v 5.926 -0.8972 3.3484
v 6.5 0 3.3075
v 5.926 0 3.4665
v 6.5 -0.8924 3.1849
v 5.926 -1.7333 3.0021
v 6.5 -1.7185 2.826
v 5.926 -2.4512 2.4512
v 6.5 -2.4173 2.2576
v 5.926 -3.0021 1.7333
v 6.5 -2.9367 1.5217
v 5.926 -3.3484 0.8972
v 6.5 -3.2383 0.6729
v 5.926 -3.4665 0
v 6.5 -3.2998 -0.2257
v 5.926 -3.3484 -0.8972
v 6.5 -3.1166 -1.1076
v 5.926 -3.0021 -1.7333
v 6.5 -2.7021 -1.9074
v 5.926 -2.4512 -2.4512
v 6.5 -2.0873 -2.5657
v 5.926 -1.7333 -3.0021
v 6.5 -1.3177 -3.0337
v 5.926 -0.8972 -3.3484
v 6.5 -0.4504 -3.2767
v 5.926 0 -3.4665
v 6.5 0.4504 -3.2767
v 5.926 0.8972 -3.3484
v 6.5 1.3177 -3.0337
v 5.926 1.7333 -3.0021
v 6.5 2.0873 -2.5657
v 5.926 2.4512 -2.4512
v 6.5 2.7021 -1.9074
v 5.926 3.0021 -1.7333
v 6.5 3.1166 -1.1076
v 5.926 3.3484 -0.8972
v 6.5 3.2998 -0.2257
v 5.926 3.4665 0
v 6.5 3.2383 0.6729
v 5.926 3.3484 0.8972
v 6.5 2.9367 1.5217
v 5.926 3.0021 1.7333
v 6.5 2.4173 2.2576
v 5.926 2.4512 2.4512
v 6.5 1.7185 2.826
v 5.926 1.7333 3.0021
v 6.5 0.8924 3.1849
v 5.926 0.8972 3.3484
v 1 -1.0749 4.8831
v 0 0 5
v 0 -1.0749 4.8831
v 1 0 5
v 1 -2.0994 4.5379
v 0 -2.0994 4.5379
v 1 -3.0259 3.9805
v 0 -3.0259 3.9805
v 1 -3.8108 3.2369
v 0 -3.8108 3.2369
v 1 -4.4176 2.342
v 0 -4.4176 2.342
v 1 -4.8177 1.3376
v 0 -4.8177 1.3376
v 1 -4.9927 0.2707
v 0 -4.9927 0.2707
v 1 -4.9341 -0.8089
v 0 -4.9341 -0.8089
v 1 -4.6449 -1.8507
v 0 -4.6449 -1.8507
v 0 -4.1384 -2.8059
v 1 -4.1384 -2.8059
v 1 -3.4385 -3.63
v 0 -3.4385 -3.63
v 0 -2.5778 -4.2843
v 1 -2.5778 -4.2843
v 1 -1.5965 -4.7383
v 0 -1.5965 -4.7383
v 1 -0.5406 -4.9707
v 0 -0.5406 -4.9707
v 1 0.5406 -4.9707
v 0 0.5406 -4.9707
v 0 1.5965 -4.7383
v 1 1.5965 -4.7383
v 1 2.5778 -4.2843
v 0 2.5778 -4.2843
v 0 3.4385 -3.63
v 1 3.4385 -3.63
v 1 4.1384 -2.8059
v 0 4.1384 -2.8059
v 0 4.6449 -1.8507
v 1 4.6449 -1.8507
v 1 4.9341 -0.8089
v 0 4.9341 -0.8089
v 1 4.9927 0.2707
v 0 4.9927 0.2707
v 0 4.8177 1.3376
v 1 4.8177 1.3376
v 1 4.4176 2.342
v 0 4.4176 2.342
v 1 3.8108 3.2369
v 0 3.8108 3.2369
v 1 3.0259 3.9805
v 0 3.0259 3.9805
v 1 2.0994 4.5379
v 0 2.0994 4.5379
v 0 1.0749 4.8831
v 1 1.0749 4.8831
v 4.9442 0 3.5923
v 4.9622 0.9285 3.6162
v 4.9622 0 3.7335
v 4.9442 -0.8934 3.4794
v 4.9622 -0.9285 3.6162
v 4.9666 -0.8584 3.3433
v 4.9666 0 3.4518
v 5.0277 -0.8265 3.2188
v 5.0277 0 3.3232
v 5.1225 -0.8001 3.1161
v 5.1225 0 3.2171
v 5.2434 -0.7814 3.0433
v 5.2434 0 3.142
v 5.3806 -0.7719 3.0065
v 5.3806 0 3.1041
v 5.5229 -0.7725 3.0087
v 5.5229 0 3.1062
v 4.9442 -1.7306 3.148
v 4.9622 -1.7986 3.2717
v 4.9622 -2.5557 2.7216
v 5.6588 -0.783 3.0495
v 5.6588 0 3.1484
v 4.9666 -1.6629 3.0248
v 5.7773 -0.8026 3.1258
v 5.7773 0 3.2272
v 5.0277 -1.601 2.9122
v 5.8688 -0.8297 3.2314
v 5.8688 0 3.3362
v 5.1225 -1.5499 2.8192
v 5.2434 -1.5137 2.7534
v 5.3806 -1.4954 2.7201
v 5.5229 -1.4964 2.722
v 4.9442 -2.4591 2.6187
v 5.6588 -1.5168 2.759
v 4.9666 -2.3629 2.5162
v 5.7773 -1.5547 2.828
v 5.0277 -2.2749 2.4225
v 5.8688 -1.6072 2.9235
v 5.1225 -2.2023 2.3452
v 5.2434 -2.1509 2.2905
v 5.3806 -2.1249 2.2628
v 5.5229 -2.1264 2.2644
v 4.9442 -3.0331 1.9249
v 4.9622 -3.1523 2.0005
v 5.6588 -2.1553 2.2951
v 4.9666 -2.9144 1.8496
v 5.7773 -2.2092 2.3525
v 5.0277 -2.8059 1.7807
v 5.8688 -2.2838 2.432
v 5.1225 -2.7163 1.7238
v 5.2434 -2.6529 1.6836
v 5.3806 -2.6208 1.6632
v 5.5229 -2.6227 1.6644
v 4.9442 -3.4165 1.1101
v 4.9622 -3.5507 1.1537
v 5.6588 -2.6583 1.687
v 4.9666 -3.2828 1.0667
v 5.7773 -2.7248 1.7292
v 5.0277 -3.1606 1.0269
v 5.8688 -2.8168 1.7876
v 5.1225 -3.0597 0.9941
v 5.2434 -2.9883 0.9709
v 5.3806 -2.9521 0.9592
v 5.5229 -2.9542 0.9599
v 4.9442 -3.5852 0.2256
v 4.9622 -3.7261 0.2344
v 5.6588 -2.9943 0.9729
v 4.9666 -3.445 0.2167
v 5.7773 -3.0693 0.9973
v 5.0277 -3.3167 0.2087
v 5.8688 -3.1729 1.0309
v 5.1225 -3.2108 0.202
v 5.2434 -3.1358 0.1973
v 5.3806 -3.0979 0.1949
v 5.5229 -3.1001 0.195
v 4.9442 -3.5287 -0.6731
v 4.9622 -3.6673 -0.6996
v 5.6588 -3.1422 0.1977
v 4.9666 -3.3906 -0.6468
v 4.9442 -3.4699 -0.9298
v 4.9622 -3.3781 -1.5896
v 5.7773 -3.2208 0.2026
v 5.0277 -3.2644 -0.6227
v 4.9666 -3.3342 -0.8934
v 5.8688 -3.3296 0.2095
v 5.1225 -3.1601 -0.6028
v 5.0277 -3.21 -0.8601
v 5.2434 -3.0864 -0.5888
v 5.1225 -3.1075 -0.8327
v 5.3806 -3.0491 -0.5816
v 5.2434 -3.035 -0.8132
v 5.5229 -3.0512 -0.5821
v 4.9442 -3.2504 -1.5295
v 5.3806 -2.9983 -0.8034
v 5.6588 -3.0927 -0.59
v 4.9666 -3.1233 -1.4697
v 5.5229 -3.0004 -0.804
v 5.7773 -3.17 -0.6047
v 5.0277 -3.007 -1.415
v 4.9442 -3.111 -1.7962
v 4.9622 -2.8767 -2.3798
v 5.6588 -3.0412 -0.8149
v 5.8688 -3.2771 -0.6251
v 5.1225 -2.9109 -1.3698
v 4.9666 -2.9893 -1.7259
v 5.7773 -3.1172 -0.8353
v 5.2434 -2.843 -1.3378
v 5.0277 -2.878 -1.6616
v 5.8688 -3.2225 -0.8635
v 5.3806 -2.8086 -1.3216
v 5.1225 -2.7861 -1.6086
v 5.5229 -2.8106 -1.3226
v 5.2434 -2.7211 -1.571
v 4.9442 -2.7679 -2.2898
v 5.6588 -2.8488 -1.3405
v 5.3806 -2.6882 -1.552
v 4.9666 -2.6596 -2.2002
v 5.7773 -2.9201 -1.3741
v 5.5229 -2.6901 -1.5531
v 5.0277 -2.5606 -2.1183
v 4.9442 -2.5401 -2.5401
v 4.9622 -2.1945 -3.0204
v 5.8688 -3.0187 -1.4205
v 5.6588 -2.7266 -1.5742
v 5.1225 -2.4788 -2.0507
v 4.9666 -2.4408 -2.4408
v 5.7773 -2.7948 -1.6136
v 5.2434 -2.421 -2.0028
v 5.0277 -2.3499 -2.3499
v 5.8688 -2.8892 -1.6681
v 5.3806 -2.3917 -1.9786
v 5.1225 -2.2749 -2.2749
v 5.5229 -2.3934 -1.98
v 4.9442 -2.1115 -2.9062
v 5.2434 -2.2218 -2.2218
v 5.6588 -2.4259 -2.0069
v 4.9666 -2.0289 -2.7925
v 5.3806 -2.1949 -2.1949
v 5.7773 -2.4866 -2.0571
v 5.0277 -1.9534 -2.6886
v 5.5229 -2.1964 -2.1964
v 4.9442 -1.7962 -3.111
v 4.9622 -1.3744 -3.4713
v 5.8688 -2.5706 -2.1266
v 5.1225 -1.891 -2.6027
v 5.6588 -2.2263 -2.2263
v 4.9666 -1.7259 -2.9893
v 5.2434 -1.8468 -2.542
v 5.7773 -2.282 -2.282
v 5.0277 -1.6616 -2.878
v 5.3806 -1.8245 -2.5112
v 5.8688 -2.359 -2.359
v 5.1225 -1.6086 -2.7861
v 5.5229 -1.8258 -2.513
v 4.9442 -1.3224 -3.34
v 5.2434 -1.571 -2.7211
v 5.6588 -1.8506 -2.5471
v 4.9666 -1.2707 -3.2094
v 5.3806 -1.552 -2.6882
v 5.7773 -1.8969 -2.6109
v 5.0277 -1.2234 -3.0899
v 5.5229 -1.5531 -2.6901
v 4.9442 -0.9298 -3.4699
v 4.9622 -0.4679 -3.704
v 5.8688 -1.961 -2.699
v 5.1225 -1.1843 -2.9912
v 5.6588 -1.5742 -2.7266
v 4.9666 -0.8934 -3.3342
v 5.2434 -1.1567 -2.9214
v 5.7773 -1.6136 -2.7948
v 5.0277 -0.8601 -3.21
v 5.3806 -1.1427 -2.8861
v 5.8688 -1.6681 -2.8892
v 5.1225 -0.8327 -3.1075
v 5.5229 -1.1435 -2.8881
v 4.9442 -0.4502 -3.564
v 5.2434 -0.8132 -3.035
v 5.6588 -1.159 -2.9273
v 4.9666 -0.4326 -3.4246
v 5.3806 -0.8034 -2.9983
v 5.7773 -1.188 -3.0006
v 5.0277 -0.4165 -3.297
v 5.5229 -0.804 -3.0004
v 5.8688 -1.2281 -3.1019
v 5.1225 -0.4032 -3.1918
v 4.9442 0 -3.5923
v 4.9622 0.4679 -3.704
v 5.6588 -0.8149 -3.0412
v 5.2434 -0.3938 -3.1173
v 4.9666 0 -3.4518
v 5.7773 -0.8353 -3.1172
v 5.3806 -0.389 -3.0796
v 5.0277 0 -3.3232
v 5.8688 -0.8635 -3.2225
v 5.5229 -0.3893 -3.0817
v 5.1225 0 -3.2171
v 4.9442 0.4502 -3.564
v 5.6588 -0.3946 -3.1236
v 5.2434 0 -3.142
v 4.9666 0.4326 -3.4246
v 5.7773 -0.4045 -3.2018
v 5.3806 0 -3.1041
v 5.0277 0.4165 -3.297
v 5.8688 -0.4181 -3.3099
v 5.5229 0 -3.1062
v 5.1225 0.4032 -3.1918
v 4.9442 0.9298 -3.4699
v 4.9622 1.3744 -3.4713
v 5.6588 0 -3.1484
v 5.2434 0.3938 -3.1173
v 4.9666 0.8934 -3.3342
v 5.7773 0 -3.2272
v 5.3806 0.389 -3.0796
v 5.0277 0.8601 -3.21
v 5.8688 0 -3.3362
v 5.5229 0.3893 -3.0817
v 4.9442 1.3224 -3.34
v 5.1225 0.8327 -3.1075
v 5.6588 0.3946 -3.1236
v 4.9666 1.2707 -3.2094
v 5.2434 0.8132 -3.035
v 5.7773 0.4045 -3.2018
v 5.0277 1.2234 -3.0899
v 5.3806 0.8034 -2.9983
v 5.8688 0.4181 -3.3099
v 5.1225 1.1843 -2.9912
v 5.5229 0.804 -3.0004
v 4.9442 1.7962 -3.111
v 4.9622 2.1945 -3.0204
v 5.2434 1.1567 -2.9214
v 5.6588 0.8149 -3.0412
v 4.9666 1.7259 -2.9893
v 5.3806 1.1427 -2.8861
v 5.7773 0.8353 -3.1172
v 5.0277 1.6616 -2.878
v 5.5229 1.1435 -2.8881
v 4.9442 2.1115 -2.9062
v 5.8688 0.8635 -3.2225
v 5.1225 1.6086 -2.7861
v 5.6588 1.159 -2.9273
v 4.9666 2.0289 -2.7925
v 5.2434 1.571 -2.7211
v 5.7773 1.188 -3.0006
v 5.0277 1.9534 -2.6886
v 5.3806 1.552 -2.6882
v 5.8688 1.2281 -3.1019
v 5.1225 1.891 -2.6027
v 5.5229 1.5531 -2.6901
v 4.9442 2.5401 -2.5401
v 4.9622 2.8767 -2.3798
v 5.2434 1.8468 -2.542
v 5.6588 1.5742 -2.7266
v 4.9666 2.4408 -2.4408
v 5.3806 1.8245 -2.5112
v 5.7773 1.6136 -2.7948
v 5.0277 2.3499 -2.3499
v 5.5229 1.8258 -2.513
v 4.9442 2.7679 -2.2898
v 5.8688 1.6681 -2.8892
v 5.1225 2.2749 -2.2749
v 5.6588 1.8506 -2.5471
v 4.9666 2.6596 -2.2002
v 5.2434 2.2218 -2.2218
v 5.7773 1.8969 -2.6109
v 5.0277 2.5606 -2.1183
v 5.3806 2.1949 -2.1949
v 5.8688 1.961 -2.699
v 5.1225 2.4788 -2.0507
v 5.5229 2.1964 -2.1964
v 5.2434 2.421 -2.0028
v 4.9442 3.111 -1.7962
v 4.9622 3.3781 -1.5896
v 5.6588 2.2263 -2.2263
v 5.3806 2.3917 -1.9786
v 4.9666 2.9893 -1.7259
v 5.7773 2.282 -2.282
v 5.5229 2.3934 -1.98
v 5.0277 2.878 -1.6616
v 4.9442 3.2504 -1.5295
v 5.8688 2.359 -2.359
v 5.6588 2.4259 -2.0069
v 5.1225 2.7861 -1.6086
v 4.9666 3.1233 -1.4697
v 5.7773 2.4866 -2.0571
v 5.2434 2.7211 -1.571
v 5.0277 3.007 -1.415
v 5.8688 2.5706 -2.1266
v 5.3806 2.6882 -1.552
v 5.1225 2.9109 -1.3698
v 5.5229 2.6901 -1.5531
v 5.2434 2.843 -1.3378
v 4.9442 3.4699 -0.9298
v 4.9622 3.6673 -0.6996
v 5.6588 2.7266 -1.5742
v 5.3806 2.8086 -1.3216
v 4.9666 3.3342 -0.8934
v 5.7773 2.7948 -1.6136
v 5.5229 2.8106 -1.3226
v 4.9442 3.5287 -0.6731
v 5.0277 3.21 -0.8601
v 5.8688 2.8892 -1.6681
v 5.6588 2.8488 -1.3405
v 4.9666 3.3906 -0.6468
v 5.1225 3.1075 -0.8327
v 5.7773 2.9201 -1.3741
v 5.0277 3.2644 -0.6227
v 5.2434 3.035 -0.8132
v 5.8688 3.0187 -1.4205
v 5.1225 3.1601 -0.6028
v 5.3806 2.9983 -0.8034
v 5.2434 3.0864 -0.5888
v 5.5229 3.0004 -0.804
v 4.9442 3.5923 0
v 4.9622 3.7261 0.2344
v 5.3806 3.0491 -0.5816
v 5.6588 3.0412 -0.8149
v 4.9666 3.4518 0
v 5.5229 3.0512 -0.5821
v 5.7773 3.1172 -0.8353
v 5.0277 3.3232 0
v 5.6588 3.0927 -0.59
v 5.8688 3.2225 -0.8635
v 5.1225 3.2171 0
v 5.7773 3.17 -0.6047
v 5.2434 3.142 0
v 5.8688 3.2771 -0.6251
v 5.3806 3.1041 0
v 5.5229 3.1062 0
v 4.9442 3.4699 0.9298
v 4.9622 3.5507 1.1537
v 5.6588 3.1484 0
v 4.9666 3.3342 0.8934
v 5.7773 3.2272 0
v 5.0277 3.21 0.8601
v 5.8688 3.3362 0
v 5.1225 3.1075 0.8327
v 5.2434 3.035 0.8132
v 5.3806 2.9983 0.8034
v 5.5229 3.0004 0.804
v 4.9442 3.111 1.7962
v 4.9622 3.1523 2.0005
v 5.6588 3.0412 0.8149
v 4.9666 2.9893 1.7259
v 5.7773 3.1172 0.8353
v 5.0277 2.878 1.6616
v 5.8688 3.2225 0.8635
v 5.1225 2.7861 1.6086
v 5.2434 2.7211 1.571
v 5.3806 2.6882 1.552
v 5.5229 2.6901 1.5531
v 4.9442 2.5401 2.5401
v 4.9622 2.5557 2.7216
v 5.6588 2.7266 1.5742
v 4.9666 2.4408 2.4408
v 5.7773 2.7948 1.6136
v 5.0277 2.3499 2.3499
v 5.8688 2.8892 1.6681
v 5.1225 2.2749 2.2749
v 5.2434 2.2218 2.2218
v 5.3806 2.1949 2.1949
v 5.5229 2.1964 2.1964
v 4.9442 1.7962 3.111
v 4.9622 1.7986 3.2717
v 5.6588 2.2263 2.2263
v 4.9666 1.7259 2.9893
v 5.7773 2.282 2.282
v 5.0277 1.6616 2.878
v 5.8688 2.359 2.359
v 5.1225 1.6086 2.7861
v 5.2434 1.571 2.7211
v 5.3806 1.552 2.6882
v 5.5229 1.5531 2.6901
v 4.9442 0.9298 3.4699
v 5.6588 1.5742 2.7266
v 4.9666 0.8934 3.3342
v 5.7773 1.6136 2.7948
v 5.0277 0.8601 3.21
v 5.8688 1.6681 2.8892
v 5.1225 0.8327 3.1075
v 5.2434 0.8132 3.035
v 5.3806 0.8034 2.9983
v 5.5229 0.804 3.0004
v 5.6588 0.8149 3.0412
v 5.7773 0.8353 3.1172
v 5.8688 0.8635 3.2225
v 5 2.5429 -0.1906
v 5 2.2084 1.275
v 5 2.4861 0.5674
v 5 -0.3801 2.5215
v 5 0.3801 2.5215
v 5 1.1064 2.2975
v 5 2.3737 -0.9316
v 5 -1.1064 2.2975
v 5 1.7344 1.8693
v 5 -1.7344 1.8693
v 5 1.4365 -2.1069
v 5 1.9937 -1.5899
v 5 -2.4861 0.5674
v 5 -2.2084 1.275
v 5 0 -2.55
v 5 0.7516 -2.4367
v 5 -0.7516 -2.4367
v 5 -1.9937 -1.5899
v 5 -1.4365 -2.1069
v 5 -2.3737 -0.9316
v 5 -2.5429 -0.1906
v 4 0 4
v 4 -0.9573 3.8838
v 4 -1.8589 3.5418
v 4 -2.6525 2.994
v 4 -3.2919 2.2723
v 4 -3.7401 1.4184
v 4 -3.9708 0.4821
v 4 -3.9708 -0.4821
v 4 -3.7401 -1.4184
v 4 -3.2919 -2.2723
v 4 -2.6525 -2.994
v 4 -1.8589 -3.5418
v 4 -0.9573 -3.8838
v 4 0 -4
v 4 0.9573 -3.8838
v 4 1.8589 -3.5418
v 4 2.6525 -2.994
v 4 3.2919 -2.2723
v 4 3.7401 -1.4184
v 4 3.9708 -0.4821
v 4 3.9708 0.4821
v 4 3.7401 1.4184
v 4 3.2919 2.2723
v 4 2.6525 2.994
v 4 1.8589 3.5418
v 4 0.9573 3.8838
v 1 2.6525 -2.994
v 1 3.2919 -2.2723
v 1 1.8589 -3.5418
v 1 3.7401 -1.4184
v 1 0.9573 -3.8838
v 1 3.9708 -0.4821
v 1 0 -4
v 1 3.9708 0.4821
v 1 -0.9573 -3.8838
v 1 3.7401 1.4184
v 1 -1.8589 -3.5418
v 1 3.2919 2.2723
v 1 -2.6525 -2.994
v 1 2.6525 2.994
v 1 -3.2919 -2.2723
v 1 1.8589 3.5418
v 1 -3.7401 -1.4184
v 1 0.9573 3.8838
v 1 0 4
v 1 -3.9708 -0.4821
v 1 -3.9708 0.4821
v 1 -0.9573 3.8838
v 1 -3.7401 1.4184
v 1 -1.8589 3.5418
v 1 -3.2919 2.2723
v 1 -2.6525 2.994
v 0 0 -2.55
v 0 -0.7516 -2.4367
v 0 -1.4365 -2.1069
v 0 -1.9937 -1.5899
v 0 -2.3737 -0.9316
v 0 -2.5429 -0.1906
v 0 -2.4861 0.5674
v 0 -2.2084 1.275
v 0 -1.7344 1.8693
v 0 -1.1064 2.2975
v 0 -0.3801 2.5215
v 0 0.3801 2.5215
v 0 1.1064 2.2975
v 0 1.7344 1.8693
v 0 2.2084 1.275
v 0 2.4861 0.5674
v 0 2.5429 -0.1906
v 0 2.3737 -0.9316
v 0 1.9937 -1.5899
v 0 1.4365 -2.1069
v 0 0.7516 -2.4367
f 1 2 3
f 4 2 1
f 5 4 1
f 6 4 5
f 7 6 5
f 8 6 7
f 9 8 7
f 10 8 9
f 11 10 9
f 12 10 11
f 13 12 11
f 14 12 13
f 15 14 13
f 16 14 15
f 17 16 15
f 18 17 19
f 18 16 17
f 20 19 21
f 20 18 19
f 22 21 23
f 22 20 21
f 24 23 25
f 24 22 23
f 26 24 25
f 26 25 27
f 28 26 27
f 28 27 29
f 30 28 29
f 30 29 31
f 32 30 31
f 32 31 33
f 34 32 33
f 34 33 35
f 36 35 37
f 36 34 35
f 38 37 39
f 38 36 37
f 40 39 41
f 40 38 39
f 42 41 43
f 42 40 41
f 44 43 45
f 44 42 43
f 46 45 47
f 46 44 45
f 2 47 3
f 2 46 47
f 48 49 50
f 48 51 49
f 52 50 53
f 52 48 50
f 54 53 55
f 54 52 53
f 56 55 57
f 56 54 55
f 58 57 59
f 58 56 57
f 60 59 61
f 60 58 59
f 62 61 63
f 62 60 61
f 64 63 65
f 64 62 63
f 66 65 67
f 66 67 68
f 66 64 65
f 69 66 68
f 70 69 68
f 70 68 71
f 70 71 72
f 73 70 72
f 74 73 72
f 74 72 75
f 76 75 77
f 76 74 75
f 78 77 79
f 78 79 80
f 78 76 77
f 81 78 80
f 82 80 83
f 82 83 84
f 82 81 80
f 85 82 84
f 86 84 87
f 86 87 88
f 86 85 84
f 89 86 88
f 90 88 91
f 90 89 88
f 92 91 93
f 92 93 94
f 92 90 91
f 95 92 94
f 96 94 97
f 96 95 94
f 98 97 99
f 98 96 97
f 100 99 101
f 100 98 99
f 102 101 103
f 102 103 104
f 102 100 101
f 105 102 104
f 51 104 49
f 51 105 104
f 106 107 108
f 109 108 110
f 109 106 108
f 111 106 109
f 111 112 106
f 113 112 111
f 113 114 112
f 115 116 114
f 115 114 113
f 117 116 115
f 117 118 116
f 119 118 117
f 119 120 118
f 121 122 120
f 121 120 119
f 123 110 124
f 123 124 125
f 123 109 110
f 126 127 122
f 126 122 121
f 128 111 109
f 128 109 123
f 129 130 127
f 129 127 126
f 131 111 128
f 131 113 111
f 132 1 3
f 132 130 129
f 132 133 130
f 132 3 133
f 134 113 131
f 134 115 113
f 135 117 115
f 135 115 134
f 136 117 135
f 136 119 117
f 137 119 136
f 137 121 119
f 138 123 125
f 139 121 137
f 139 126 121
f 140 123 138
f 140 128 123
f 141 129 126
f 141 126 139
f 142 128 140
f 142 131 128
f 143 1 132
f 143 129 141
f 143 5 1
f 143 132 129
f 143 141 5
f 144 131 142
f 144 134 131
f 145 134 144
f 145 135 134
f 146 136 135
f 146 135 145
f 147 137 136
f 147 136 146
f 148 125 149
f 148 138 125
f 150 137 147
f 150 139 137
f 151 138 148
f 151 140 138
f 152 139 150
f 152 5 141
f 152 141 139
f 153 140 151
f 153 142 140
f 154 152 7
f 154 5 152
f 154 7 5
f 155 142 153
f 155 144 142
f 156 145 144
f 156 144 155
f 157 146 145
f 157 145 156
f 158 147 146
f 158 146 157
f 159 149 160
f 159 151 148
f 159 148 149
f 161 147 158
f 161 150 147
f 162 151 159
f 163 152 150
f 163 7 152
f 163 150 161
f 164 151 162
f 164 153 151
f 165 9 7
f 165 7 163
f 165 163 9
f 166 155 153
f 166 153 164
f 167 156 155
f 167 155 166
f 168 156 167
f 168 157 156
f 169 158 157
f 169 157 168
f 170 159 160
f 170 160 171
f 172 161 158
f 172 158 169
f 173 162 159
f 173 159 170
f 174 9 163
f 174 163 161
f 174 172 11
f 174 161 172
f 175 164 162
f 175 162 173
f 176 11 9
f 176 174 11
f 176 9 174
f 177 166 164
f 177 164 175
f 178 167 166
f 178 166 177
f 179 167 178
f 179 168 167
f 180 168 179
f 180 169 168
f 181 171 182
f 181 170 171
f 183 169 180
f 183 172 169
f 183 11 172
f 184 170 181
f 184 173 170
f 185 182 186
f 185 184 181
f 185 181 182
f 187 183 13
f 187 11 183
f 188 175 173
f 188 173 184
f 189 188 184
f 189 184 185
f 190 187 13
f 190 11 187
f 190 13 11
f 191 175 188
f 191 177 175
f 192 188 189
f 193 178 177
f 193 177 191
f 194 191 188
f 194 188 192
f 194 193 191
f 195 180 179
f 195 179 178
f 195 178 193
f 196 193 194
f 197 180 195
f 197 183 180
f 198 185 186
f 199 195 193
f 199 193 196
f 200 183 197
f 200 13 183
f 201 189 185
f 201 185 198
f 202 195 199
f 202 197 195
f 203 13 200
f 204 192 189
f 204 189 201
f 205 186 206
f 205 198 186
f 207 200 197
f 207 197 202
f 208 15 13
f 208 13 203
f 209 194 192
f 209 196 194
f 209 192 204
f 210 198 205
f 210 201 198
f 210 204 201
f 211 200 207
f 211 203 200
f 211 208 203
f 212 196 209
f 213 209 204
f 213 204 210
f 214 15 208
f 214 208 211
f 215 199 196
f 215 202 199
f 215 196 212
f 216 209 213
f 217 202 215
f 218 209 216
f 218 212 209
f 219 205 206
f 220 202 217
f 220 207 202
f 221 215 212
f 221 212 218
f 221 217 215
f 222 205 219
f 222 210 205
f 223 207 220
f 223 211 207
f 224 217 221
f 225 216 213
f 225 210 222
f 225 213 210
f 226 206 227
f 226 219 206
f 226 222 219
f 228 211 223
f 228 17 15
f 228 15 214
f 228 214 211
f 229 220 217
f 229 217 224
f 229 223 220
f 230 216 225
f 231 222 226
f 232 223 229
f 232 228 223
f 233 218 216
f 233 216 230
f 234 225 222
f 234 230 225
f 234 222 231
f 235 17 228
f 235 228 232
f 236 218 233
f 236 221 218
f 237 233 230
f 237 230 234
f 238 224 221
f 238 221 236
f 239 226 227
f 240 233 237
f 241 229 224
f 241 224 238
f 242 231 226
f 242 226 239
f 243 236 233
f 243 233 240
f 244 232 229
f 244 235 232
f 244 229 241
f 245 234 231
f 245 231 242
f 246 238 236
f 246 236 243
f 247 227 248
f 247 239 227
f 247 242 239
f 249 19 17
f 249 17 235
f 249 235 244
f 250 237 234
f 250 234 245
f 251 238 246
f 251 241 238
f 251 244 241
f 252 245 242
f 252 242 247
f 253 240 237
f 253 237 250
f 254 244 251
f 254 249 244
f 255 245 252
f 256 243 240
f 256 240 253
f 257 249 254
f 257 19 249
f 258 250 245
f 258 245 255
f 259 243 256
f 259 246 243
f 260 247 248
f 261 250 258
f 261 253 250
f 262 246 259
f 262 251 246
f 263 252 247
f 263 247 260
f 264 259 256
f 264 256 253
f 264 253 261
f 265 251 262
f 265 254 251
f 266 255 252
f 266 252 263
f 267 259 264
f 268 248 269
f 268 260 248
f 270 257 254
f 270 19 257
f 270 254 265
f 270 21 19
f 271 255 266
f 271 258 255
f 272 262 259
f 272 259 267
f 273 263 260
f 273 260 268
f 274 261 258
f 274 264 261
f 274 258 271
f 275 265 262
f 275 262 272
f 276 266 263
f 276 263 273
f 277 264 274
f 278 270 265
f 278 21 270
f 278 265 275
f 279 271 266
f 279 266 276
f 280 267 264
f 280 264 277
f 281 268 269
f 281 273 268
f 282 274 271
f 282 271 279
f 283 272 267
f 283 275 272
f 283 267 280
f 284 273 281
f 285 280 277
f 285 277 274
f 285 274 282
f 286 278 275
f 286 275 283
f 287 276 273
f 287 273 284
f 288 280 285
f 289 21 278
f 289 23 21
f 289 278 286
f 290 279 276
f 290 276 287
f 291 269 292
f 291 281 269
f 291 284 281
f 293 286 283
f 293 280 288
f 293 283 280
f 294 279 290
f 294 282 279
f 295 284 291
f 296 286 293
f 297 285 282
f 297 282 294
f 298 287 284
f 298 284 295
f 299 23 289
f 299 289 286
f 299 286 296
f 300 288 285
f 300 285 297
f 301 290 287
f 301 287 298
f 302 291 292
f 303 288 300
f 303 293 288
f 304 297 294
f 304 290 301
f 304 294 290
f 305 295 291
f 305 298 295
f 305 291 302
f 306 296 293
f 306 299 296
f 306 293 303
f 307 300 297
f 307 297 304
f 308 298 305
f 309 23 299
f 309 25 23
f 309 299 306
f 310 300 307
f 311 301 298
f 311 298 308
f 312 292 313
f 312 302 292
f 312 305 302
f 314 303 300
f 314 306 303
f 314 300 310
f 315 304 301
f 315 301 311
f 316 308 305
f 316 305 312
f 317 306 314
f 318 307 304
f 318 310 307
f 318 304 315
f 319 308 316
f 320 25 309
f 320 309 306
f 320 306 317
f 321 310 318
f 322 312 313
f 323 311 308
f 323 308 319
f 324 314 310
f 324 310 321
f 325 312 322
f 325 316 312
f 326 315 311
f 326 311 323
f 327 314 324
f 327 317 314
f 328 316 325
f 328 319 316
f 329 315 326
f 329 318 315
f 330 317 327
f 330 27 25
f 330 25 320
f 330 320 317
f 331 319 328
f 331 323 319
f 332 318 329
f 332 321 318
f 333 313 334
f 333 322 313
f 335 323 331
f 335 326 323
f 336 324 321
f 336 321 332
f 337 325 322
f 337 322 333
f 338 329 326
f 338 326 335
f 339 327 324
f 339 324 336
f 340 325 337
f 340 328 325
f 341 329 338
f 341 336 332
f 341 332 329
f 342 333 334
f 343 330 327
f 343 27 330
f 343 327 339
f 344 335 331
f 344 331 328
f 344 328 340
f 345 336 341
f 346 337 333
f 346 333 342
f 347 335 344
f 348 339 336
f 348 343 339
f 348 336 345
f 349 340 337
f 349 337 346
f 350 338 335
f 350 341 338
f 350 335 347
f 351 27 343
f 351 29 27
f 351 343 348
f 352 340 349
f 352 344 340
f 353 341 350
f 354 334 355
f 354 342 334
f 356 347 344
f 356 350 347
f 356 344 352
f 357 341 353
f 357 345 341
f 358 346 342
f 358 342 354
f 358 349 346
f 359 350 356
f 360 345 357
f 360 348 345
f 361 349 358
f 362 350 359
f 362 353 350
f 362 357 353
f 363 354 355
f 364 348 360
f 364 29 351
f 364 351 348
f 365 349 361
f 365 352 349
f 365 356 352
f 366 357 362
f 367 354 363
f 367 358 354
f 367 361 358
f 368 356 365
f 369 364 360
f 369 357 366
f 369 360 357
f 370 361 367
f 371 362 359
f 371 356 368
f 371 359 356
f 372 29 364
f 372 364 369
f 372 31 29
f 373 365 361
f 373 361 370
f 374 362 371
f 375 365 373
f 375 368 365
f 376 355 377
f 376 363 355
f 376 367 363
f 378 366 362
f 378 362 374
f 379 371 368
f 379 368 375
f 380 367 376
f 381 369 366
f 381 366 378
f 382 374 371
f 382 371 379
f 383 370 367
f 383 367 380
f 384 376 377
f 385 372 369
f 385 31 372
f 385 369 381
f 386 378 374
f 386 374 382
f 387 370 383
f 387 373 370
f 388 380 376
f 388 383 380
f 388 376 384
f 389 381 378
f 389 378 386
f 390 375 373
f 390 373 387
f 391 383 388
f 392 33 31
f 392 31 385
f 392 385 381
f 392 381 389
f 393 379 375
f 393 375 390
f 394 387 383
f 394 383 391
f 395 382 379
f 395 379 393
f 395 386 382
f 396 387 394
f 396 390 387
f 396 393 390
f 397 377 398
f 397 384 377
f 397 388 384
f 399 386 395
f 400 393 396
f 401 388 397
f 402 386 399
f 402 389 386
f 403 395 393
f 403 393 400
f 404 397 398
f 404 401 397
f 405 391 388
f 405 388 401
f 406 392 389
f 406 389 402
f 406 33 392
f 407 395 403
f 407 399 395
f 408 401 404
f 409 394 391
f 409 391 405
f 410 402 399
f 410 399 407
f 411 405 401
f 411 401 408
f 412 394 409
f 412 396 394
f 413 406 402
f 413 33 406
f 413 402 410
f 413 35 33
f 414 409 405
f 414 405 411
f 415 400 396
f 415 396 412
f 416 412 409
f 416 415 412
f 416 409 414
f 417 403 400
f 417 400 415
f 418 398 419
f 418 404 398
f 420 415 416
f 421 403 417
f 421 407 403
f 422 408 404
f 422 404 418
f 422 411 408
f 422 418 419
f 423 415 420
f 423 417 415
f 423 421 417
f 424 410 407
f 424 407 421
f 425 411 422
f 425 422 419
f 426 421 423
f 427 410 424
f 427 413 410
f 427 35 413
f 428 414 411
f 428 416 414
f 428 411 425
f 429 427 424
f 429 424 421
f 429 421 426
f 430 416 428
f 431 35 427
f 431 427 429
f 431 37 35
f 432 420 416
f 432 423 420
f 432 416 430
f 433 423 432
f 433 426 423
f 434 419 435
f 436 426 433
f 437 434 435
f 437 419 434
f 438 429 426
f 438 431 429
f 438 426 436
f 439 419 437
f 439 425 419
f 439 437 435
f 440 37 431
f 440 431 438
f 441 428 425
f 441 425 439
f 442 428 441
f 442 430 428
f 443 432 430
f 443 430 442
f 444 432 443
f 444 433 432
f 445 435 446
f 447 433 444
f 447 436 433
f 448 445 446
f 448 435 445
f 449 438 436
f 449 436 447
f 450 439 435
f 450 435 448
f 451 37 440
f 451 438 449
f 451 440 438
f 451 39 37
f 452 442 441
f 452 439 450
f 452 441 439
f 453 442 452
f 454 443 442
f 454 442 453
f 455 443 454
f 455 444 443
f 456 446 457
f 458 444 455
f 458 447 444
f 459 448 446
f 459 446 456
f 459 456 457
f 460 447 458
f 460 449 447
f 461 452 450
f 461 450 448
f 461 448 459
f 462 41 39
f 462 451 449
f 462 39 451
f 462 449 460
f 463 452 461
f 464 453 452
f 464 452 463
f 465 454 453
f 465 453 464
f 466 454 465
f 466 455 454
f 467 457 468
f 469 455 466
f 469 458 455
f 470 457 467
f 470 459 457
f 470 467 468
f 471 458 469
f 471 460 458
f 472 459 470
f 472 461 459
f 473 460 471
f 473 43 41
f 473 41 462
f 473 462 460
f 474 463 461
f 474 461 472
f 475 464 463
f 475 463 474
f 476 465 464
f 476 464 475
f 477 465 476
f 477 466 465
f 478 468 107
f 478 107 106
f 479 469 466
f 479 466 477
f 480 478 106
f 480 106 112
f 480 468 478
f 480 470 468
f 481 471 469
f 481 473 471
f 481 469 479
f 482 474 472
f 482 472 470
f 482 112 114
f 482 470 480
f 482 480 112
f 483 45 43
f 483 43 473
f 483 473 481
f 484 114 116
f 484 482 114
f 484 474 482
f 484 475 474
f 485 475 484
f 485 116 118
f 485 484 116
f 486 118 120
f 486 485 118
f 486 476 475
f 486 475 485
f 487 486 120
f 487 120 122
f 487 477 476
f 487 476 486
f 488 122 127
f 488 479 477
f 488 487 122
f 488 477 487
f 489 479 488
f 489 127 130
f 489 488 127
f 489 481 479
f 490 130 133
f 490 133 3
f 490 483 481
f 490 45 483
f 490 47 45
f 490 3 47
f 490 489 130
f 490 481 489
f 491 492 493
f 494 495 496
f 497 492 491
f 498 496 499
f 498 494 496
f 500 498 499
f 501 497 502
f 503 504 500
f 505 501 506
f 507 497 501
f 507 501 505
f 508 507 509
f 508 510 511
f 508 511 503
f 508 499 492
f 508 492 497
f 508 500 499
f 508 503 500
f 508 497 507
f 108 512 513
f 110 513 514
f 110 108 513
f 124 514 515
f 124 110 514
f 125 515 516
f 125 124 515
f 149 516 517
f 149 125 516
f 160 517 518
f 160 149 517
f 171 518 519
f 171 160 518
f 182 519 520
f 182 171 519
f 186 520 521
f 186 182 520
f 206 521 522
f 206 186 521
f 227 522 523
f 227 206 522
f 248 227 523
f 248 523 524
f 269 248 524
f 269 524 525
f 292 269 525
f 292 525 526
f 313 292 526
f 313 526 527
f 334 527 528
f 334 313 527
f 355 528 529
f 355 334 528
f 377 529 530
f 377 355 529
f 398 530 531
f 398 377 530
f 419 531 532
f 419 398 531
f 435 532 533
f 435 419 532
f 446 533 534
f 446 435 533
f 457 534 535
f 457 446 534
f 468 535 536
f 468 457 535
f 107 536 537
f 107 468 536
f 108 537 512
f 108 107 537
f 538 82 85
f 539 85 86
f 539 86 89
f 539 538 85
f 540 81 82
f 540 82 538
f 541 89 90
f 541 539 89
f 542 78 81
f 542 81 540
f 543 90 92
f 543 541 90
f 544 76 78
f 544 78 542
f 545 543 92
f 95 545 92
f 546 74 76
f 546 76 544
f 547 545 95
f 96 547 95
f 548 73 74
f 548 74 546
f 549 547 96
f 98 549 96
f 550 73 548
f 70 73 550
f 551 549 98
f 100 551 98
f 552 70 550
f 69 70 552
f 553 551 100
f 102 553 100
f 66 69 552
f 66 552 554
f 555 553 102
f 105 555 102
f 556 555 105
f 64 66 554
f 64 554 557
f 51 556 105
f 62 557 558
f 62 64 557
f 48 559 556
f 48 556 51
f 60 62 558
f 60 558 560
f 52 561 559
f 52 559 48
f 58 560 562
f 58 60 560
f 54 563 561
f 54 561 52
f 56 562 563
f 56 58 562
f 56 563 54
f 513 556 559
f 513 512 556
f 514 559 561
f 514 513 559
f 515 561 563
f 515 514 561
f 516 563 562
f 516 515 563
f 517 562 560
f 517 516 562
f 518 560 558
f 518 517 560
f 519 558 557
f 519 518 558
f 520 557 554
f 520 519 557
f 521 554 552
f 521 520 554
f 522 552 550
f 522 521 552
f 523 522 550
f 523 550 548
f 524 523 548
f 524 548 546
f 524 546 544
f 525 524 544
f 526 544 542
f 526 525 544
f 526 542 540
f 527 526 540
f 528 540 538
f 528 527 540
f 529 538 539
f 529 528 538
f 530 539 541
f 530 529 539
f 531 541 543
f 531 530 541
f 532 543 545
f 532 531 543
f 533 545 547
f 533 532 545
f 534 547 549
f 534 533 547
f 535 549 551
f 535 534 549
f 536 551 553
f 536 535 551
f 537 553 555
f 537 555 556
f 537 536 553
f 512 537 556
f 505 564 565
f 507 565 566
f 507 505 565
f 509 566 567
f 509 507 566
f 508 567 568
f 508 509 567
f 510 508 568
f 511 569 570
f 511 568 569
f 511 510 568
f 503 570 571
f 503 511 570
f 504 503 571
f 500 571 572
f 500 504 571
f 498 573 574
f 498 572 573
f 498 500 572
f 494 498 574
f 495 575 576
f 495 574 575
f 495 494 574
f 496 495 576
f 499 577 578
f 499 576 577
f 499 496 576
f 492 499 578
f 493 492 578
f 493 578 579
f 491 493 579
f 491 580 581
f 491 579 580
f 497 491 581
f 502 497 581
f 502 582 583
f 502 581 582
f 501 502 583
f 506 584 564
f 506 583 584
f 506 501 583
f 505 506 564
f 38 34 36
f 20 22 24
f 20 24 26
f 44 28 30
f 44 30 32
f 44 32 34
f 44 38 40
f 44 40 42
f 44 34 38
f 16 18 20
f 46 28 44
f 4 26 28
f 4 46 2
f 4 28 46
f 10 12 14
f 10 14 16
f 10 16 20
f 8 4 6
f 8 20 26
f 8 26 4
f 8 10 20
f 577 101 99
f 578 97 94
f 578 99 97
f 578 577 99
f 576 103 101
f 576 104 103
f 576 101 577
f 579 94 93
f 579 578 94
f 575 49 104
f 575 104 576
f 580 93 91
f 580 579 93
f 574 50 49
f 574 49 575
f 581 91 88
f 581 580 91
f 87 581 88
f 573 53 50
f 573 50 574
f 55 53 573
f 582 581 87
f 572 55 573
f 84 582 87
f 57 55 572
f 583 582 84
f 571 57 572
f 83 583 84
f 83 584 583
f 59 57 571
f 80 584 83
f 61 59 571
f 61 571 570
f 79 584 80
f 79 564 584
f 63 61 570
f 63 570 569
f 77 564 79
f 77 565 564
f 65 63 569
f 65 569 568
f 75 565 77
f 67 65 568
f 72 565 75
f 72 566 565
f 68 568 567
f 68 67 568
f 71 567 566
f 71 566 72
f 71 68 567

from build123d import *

# Parameters (mm, degrees)
SKETCH3_R               = 1.75
BOSS_EXTRUDE1_DEPTH     = 4
CUT_EXTRUDE1_DEPTH      = 10.604686356
CUT_EXTRUDE1_DEPTH_BACK = 5
SKETCH4_R               = 2.55


with BuildPart() as part:
    # Sketch2 → Revolve1 (revolve)
    with BuildSketch(Plane(origin=(0, 0, 0), x_dir=(1, 0, 0), z_dir=(0, 1, 0)), mode=Mode.PRIVATE) as revolve1_sk:
        with BuildLine():
            Line((0, 0), (0, 5))
            Line((0, 5), (1, 5))
            Line((1, 5), (1, 4))
            Line((1, 4), (4, 4))
            Line((4, 4), (4.962239732, 3.733469404))
            ThreePointArc((4.962239732, 3.733469404), (5.310627067, 3.11814326), (5.925953212, 3.466530596))
            Line((5.925953212, 3.466530596), (6.5, 3.307525488))
            Line((6.5, 3.307525488), (6.5, 0))
            Line((6.5, 0), (0, 0))
        make_face()
    revolve(revolve1_sk.sketch.rotate(Axis((0, 0, 0), (1, 0, 0)), 180), axis=Axis((0, 0, 0), (1, 0, 0)))

    # Sketch3 → Boss-Extrude1 (add)
    with BuildSketch(Plane.ZY):
        Circle(SKETCH3_R)
    extrude(amount=-BOSS_EXTRUDE1_DEPTH)

    # Sketch4 → Cut-Extrude1 (cut, two sides: drawn at the far end of the back side and taken through both)
    with BuildSketch(Plane.ZY.offset(-CUT_EXTRUDE1_DEPTH_BACK)):
        with Locations(Location((0, 0, 0), (0, 0, 180))):
            Circle(SKETCH4_R)
    extrude(amount=CUT_EXTRUDE1_DEPTH + CUT_EXTRUDE1_DEPTH_BACK, mode=Mode.SUBTRACT)


solid = part.part
